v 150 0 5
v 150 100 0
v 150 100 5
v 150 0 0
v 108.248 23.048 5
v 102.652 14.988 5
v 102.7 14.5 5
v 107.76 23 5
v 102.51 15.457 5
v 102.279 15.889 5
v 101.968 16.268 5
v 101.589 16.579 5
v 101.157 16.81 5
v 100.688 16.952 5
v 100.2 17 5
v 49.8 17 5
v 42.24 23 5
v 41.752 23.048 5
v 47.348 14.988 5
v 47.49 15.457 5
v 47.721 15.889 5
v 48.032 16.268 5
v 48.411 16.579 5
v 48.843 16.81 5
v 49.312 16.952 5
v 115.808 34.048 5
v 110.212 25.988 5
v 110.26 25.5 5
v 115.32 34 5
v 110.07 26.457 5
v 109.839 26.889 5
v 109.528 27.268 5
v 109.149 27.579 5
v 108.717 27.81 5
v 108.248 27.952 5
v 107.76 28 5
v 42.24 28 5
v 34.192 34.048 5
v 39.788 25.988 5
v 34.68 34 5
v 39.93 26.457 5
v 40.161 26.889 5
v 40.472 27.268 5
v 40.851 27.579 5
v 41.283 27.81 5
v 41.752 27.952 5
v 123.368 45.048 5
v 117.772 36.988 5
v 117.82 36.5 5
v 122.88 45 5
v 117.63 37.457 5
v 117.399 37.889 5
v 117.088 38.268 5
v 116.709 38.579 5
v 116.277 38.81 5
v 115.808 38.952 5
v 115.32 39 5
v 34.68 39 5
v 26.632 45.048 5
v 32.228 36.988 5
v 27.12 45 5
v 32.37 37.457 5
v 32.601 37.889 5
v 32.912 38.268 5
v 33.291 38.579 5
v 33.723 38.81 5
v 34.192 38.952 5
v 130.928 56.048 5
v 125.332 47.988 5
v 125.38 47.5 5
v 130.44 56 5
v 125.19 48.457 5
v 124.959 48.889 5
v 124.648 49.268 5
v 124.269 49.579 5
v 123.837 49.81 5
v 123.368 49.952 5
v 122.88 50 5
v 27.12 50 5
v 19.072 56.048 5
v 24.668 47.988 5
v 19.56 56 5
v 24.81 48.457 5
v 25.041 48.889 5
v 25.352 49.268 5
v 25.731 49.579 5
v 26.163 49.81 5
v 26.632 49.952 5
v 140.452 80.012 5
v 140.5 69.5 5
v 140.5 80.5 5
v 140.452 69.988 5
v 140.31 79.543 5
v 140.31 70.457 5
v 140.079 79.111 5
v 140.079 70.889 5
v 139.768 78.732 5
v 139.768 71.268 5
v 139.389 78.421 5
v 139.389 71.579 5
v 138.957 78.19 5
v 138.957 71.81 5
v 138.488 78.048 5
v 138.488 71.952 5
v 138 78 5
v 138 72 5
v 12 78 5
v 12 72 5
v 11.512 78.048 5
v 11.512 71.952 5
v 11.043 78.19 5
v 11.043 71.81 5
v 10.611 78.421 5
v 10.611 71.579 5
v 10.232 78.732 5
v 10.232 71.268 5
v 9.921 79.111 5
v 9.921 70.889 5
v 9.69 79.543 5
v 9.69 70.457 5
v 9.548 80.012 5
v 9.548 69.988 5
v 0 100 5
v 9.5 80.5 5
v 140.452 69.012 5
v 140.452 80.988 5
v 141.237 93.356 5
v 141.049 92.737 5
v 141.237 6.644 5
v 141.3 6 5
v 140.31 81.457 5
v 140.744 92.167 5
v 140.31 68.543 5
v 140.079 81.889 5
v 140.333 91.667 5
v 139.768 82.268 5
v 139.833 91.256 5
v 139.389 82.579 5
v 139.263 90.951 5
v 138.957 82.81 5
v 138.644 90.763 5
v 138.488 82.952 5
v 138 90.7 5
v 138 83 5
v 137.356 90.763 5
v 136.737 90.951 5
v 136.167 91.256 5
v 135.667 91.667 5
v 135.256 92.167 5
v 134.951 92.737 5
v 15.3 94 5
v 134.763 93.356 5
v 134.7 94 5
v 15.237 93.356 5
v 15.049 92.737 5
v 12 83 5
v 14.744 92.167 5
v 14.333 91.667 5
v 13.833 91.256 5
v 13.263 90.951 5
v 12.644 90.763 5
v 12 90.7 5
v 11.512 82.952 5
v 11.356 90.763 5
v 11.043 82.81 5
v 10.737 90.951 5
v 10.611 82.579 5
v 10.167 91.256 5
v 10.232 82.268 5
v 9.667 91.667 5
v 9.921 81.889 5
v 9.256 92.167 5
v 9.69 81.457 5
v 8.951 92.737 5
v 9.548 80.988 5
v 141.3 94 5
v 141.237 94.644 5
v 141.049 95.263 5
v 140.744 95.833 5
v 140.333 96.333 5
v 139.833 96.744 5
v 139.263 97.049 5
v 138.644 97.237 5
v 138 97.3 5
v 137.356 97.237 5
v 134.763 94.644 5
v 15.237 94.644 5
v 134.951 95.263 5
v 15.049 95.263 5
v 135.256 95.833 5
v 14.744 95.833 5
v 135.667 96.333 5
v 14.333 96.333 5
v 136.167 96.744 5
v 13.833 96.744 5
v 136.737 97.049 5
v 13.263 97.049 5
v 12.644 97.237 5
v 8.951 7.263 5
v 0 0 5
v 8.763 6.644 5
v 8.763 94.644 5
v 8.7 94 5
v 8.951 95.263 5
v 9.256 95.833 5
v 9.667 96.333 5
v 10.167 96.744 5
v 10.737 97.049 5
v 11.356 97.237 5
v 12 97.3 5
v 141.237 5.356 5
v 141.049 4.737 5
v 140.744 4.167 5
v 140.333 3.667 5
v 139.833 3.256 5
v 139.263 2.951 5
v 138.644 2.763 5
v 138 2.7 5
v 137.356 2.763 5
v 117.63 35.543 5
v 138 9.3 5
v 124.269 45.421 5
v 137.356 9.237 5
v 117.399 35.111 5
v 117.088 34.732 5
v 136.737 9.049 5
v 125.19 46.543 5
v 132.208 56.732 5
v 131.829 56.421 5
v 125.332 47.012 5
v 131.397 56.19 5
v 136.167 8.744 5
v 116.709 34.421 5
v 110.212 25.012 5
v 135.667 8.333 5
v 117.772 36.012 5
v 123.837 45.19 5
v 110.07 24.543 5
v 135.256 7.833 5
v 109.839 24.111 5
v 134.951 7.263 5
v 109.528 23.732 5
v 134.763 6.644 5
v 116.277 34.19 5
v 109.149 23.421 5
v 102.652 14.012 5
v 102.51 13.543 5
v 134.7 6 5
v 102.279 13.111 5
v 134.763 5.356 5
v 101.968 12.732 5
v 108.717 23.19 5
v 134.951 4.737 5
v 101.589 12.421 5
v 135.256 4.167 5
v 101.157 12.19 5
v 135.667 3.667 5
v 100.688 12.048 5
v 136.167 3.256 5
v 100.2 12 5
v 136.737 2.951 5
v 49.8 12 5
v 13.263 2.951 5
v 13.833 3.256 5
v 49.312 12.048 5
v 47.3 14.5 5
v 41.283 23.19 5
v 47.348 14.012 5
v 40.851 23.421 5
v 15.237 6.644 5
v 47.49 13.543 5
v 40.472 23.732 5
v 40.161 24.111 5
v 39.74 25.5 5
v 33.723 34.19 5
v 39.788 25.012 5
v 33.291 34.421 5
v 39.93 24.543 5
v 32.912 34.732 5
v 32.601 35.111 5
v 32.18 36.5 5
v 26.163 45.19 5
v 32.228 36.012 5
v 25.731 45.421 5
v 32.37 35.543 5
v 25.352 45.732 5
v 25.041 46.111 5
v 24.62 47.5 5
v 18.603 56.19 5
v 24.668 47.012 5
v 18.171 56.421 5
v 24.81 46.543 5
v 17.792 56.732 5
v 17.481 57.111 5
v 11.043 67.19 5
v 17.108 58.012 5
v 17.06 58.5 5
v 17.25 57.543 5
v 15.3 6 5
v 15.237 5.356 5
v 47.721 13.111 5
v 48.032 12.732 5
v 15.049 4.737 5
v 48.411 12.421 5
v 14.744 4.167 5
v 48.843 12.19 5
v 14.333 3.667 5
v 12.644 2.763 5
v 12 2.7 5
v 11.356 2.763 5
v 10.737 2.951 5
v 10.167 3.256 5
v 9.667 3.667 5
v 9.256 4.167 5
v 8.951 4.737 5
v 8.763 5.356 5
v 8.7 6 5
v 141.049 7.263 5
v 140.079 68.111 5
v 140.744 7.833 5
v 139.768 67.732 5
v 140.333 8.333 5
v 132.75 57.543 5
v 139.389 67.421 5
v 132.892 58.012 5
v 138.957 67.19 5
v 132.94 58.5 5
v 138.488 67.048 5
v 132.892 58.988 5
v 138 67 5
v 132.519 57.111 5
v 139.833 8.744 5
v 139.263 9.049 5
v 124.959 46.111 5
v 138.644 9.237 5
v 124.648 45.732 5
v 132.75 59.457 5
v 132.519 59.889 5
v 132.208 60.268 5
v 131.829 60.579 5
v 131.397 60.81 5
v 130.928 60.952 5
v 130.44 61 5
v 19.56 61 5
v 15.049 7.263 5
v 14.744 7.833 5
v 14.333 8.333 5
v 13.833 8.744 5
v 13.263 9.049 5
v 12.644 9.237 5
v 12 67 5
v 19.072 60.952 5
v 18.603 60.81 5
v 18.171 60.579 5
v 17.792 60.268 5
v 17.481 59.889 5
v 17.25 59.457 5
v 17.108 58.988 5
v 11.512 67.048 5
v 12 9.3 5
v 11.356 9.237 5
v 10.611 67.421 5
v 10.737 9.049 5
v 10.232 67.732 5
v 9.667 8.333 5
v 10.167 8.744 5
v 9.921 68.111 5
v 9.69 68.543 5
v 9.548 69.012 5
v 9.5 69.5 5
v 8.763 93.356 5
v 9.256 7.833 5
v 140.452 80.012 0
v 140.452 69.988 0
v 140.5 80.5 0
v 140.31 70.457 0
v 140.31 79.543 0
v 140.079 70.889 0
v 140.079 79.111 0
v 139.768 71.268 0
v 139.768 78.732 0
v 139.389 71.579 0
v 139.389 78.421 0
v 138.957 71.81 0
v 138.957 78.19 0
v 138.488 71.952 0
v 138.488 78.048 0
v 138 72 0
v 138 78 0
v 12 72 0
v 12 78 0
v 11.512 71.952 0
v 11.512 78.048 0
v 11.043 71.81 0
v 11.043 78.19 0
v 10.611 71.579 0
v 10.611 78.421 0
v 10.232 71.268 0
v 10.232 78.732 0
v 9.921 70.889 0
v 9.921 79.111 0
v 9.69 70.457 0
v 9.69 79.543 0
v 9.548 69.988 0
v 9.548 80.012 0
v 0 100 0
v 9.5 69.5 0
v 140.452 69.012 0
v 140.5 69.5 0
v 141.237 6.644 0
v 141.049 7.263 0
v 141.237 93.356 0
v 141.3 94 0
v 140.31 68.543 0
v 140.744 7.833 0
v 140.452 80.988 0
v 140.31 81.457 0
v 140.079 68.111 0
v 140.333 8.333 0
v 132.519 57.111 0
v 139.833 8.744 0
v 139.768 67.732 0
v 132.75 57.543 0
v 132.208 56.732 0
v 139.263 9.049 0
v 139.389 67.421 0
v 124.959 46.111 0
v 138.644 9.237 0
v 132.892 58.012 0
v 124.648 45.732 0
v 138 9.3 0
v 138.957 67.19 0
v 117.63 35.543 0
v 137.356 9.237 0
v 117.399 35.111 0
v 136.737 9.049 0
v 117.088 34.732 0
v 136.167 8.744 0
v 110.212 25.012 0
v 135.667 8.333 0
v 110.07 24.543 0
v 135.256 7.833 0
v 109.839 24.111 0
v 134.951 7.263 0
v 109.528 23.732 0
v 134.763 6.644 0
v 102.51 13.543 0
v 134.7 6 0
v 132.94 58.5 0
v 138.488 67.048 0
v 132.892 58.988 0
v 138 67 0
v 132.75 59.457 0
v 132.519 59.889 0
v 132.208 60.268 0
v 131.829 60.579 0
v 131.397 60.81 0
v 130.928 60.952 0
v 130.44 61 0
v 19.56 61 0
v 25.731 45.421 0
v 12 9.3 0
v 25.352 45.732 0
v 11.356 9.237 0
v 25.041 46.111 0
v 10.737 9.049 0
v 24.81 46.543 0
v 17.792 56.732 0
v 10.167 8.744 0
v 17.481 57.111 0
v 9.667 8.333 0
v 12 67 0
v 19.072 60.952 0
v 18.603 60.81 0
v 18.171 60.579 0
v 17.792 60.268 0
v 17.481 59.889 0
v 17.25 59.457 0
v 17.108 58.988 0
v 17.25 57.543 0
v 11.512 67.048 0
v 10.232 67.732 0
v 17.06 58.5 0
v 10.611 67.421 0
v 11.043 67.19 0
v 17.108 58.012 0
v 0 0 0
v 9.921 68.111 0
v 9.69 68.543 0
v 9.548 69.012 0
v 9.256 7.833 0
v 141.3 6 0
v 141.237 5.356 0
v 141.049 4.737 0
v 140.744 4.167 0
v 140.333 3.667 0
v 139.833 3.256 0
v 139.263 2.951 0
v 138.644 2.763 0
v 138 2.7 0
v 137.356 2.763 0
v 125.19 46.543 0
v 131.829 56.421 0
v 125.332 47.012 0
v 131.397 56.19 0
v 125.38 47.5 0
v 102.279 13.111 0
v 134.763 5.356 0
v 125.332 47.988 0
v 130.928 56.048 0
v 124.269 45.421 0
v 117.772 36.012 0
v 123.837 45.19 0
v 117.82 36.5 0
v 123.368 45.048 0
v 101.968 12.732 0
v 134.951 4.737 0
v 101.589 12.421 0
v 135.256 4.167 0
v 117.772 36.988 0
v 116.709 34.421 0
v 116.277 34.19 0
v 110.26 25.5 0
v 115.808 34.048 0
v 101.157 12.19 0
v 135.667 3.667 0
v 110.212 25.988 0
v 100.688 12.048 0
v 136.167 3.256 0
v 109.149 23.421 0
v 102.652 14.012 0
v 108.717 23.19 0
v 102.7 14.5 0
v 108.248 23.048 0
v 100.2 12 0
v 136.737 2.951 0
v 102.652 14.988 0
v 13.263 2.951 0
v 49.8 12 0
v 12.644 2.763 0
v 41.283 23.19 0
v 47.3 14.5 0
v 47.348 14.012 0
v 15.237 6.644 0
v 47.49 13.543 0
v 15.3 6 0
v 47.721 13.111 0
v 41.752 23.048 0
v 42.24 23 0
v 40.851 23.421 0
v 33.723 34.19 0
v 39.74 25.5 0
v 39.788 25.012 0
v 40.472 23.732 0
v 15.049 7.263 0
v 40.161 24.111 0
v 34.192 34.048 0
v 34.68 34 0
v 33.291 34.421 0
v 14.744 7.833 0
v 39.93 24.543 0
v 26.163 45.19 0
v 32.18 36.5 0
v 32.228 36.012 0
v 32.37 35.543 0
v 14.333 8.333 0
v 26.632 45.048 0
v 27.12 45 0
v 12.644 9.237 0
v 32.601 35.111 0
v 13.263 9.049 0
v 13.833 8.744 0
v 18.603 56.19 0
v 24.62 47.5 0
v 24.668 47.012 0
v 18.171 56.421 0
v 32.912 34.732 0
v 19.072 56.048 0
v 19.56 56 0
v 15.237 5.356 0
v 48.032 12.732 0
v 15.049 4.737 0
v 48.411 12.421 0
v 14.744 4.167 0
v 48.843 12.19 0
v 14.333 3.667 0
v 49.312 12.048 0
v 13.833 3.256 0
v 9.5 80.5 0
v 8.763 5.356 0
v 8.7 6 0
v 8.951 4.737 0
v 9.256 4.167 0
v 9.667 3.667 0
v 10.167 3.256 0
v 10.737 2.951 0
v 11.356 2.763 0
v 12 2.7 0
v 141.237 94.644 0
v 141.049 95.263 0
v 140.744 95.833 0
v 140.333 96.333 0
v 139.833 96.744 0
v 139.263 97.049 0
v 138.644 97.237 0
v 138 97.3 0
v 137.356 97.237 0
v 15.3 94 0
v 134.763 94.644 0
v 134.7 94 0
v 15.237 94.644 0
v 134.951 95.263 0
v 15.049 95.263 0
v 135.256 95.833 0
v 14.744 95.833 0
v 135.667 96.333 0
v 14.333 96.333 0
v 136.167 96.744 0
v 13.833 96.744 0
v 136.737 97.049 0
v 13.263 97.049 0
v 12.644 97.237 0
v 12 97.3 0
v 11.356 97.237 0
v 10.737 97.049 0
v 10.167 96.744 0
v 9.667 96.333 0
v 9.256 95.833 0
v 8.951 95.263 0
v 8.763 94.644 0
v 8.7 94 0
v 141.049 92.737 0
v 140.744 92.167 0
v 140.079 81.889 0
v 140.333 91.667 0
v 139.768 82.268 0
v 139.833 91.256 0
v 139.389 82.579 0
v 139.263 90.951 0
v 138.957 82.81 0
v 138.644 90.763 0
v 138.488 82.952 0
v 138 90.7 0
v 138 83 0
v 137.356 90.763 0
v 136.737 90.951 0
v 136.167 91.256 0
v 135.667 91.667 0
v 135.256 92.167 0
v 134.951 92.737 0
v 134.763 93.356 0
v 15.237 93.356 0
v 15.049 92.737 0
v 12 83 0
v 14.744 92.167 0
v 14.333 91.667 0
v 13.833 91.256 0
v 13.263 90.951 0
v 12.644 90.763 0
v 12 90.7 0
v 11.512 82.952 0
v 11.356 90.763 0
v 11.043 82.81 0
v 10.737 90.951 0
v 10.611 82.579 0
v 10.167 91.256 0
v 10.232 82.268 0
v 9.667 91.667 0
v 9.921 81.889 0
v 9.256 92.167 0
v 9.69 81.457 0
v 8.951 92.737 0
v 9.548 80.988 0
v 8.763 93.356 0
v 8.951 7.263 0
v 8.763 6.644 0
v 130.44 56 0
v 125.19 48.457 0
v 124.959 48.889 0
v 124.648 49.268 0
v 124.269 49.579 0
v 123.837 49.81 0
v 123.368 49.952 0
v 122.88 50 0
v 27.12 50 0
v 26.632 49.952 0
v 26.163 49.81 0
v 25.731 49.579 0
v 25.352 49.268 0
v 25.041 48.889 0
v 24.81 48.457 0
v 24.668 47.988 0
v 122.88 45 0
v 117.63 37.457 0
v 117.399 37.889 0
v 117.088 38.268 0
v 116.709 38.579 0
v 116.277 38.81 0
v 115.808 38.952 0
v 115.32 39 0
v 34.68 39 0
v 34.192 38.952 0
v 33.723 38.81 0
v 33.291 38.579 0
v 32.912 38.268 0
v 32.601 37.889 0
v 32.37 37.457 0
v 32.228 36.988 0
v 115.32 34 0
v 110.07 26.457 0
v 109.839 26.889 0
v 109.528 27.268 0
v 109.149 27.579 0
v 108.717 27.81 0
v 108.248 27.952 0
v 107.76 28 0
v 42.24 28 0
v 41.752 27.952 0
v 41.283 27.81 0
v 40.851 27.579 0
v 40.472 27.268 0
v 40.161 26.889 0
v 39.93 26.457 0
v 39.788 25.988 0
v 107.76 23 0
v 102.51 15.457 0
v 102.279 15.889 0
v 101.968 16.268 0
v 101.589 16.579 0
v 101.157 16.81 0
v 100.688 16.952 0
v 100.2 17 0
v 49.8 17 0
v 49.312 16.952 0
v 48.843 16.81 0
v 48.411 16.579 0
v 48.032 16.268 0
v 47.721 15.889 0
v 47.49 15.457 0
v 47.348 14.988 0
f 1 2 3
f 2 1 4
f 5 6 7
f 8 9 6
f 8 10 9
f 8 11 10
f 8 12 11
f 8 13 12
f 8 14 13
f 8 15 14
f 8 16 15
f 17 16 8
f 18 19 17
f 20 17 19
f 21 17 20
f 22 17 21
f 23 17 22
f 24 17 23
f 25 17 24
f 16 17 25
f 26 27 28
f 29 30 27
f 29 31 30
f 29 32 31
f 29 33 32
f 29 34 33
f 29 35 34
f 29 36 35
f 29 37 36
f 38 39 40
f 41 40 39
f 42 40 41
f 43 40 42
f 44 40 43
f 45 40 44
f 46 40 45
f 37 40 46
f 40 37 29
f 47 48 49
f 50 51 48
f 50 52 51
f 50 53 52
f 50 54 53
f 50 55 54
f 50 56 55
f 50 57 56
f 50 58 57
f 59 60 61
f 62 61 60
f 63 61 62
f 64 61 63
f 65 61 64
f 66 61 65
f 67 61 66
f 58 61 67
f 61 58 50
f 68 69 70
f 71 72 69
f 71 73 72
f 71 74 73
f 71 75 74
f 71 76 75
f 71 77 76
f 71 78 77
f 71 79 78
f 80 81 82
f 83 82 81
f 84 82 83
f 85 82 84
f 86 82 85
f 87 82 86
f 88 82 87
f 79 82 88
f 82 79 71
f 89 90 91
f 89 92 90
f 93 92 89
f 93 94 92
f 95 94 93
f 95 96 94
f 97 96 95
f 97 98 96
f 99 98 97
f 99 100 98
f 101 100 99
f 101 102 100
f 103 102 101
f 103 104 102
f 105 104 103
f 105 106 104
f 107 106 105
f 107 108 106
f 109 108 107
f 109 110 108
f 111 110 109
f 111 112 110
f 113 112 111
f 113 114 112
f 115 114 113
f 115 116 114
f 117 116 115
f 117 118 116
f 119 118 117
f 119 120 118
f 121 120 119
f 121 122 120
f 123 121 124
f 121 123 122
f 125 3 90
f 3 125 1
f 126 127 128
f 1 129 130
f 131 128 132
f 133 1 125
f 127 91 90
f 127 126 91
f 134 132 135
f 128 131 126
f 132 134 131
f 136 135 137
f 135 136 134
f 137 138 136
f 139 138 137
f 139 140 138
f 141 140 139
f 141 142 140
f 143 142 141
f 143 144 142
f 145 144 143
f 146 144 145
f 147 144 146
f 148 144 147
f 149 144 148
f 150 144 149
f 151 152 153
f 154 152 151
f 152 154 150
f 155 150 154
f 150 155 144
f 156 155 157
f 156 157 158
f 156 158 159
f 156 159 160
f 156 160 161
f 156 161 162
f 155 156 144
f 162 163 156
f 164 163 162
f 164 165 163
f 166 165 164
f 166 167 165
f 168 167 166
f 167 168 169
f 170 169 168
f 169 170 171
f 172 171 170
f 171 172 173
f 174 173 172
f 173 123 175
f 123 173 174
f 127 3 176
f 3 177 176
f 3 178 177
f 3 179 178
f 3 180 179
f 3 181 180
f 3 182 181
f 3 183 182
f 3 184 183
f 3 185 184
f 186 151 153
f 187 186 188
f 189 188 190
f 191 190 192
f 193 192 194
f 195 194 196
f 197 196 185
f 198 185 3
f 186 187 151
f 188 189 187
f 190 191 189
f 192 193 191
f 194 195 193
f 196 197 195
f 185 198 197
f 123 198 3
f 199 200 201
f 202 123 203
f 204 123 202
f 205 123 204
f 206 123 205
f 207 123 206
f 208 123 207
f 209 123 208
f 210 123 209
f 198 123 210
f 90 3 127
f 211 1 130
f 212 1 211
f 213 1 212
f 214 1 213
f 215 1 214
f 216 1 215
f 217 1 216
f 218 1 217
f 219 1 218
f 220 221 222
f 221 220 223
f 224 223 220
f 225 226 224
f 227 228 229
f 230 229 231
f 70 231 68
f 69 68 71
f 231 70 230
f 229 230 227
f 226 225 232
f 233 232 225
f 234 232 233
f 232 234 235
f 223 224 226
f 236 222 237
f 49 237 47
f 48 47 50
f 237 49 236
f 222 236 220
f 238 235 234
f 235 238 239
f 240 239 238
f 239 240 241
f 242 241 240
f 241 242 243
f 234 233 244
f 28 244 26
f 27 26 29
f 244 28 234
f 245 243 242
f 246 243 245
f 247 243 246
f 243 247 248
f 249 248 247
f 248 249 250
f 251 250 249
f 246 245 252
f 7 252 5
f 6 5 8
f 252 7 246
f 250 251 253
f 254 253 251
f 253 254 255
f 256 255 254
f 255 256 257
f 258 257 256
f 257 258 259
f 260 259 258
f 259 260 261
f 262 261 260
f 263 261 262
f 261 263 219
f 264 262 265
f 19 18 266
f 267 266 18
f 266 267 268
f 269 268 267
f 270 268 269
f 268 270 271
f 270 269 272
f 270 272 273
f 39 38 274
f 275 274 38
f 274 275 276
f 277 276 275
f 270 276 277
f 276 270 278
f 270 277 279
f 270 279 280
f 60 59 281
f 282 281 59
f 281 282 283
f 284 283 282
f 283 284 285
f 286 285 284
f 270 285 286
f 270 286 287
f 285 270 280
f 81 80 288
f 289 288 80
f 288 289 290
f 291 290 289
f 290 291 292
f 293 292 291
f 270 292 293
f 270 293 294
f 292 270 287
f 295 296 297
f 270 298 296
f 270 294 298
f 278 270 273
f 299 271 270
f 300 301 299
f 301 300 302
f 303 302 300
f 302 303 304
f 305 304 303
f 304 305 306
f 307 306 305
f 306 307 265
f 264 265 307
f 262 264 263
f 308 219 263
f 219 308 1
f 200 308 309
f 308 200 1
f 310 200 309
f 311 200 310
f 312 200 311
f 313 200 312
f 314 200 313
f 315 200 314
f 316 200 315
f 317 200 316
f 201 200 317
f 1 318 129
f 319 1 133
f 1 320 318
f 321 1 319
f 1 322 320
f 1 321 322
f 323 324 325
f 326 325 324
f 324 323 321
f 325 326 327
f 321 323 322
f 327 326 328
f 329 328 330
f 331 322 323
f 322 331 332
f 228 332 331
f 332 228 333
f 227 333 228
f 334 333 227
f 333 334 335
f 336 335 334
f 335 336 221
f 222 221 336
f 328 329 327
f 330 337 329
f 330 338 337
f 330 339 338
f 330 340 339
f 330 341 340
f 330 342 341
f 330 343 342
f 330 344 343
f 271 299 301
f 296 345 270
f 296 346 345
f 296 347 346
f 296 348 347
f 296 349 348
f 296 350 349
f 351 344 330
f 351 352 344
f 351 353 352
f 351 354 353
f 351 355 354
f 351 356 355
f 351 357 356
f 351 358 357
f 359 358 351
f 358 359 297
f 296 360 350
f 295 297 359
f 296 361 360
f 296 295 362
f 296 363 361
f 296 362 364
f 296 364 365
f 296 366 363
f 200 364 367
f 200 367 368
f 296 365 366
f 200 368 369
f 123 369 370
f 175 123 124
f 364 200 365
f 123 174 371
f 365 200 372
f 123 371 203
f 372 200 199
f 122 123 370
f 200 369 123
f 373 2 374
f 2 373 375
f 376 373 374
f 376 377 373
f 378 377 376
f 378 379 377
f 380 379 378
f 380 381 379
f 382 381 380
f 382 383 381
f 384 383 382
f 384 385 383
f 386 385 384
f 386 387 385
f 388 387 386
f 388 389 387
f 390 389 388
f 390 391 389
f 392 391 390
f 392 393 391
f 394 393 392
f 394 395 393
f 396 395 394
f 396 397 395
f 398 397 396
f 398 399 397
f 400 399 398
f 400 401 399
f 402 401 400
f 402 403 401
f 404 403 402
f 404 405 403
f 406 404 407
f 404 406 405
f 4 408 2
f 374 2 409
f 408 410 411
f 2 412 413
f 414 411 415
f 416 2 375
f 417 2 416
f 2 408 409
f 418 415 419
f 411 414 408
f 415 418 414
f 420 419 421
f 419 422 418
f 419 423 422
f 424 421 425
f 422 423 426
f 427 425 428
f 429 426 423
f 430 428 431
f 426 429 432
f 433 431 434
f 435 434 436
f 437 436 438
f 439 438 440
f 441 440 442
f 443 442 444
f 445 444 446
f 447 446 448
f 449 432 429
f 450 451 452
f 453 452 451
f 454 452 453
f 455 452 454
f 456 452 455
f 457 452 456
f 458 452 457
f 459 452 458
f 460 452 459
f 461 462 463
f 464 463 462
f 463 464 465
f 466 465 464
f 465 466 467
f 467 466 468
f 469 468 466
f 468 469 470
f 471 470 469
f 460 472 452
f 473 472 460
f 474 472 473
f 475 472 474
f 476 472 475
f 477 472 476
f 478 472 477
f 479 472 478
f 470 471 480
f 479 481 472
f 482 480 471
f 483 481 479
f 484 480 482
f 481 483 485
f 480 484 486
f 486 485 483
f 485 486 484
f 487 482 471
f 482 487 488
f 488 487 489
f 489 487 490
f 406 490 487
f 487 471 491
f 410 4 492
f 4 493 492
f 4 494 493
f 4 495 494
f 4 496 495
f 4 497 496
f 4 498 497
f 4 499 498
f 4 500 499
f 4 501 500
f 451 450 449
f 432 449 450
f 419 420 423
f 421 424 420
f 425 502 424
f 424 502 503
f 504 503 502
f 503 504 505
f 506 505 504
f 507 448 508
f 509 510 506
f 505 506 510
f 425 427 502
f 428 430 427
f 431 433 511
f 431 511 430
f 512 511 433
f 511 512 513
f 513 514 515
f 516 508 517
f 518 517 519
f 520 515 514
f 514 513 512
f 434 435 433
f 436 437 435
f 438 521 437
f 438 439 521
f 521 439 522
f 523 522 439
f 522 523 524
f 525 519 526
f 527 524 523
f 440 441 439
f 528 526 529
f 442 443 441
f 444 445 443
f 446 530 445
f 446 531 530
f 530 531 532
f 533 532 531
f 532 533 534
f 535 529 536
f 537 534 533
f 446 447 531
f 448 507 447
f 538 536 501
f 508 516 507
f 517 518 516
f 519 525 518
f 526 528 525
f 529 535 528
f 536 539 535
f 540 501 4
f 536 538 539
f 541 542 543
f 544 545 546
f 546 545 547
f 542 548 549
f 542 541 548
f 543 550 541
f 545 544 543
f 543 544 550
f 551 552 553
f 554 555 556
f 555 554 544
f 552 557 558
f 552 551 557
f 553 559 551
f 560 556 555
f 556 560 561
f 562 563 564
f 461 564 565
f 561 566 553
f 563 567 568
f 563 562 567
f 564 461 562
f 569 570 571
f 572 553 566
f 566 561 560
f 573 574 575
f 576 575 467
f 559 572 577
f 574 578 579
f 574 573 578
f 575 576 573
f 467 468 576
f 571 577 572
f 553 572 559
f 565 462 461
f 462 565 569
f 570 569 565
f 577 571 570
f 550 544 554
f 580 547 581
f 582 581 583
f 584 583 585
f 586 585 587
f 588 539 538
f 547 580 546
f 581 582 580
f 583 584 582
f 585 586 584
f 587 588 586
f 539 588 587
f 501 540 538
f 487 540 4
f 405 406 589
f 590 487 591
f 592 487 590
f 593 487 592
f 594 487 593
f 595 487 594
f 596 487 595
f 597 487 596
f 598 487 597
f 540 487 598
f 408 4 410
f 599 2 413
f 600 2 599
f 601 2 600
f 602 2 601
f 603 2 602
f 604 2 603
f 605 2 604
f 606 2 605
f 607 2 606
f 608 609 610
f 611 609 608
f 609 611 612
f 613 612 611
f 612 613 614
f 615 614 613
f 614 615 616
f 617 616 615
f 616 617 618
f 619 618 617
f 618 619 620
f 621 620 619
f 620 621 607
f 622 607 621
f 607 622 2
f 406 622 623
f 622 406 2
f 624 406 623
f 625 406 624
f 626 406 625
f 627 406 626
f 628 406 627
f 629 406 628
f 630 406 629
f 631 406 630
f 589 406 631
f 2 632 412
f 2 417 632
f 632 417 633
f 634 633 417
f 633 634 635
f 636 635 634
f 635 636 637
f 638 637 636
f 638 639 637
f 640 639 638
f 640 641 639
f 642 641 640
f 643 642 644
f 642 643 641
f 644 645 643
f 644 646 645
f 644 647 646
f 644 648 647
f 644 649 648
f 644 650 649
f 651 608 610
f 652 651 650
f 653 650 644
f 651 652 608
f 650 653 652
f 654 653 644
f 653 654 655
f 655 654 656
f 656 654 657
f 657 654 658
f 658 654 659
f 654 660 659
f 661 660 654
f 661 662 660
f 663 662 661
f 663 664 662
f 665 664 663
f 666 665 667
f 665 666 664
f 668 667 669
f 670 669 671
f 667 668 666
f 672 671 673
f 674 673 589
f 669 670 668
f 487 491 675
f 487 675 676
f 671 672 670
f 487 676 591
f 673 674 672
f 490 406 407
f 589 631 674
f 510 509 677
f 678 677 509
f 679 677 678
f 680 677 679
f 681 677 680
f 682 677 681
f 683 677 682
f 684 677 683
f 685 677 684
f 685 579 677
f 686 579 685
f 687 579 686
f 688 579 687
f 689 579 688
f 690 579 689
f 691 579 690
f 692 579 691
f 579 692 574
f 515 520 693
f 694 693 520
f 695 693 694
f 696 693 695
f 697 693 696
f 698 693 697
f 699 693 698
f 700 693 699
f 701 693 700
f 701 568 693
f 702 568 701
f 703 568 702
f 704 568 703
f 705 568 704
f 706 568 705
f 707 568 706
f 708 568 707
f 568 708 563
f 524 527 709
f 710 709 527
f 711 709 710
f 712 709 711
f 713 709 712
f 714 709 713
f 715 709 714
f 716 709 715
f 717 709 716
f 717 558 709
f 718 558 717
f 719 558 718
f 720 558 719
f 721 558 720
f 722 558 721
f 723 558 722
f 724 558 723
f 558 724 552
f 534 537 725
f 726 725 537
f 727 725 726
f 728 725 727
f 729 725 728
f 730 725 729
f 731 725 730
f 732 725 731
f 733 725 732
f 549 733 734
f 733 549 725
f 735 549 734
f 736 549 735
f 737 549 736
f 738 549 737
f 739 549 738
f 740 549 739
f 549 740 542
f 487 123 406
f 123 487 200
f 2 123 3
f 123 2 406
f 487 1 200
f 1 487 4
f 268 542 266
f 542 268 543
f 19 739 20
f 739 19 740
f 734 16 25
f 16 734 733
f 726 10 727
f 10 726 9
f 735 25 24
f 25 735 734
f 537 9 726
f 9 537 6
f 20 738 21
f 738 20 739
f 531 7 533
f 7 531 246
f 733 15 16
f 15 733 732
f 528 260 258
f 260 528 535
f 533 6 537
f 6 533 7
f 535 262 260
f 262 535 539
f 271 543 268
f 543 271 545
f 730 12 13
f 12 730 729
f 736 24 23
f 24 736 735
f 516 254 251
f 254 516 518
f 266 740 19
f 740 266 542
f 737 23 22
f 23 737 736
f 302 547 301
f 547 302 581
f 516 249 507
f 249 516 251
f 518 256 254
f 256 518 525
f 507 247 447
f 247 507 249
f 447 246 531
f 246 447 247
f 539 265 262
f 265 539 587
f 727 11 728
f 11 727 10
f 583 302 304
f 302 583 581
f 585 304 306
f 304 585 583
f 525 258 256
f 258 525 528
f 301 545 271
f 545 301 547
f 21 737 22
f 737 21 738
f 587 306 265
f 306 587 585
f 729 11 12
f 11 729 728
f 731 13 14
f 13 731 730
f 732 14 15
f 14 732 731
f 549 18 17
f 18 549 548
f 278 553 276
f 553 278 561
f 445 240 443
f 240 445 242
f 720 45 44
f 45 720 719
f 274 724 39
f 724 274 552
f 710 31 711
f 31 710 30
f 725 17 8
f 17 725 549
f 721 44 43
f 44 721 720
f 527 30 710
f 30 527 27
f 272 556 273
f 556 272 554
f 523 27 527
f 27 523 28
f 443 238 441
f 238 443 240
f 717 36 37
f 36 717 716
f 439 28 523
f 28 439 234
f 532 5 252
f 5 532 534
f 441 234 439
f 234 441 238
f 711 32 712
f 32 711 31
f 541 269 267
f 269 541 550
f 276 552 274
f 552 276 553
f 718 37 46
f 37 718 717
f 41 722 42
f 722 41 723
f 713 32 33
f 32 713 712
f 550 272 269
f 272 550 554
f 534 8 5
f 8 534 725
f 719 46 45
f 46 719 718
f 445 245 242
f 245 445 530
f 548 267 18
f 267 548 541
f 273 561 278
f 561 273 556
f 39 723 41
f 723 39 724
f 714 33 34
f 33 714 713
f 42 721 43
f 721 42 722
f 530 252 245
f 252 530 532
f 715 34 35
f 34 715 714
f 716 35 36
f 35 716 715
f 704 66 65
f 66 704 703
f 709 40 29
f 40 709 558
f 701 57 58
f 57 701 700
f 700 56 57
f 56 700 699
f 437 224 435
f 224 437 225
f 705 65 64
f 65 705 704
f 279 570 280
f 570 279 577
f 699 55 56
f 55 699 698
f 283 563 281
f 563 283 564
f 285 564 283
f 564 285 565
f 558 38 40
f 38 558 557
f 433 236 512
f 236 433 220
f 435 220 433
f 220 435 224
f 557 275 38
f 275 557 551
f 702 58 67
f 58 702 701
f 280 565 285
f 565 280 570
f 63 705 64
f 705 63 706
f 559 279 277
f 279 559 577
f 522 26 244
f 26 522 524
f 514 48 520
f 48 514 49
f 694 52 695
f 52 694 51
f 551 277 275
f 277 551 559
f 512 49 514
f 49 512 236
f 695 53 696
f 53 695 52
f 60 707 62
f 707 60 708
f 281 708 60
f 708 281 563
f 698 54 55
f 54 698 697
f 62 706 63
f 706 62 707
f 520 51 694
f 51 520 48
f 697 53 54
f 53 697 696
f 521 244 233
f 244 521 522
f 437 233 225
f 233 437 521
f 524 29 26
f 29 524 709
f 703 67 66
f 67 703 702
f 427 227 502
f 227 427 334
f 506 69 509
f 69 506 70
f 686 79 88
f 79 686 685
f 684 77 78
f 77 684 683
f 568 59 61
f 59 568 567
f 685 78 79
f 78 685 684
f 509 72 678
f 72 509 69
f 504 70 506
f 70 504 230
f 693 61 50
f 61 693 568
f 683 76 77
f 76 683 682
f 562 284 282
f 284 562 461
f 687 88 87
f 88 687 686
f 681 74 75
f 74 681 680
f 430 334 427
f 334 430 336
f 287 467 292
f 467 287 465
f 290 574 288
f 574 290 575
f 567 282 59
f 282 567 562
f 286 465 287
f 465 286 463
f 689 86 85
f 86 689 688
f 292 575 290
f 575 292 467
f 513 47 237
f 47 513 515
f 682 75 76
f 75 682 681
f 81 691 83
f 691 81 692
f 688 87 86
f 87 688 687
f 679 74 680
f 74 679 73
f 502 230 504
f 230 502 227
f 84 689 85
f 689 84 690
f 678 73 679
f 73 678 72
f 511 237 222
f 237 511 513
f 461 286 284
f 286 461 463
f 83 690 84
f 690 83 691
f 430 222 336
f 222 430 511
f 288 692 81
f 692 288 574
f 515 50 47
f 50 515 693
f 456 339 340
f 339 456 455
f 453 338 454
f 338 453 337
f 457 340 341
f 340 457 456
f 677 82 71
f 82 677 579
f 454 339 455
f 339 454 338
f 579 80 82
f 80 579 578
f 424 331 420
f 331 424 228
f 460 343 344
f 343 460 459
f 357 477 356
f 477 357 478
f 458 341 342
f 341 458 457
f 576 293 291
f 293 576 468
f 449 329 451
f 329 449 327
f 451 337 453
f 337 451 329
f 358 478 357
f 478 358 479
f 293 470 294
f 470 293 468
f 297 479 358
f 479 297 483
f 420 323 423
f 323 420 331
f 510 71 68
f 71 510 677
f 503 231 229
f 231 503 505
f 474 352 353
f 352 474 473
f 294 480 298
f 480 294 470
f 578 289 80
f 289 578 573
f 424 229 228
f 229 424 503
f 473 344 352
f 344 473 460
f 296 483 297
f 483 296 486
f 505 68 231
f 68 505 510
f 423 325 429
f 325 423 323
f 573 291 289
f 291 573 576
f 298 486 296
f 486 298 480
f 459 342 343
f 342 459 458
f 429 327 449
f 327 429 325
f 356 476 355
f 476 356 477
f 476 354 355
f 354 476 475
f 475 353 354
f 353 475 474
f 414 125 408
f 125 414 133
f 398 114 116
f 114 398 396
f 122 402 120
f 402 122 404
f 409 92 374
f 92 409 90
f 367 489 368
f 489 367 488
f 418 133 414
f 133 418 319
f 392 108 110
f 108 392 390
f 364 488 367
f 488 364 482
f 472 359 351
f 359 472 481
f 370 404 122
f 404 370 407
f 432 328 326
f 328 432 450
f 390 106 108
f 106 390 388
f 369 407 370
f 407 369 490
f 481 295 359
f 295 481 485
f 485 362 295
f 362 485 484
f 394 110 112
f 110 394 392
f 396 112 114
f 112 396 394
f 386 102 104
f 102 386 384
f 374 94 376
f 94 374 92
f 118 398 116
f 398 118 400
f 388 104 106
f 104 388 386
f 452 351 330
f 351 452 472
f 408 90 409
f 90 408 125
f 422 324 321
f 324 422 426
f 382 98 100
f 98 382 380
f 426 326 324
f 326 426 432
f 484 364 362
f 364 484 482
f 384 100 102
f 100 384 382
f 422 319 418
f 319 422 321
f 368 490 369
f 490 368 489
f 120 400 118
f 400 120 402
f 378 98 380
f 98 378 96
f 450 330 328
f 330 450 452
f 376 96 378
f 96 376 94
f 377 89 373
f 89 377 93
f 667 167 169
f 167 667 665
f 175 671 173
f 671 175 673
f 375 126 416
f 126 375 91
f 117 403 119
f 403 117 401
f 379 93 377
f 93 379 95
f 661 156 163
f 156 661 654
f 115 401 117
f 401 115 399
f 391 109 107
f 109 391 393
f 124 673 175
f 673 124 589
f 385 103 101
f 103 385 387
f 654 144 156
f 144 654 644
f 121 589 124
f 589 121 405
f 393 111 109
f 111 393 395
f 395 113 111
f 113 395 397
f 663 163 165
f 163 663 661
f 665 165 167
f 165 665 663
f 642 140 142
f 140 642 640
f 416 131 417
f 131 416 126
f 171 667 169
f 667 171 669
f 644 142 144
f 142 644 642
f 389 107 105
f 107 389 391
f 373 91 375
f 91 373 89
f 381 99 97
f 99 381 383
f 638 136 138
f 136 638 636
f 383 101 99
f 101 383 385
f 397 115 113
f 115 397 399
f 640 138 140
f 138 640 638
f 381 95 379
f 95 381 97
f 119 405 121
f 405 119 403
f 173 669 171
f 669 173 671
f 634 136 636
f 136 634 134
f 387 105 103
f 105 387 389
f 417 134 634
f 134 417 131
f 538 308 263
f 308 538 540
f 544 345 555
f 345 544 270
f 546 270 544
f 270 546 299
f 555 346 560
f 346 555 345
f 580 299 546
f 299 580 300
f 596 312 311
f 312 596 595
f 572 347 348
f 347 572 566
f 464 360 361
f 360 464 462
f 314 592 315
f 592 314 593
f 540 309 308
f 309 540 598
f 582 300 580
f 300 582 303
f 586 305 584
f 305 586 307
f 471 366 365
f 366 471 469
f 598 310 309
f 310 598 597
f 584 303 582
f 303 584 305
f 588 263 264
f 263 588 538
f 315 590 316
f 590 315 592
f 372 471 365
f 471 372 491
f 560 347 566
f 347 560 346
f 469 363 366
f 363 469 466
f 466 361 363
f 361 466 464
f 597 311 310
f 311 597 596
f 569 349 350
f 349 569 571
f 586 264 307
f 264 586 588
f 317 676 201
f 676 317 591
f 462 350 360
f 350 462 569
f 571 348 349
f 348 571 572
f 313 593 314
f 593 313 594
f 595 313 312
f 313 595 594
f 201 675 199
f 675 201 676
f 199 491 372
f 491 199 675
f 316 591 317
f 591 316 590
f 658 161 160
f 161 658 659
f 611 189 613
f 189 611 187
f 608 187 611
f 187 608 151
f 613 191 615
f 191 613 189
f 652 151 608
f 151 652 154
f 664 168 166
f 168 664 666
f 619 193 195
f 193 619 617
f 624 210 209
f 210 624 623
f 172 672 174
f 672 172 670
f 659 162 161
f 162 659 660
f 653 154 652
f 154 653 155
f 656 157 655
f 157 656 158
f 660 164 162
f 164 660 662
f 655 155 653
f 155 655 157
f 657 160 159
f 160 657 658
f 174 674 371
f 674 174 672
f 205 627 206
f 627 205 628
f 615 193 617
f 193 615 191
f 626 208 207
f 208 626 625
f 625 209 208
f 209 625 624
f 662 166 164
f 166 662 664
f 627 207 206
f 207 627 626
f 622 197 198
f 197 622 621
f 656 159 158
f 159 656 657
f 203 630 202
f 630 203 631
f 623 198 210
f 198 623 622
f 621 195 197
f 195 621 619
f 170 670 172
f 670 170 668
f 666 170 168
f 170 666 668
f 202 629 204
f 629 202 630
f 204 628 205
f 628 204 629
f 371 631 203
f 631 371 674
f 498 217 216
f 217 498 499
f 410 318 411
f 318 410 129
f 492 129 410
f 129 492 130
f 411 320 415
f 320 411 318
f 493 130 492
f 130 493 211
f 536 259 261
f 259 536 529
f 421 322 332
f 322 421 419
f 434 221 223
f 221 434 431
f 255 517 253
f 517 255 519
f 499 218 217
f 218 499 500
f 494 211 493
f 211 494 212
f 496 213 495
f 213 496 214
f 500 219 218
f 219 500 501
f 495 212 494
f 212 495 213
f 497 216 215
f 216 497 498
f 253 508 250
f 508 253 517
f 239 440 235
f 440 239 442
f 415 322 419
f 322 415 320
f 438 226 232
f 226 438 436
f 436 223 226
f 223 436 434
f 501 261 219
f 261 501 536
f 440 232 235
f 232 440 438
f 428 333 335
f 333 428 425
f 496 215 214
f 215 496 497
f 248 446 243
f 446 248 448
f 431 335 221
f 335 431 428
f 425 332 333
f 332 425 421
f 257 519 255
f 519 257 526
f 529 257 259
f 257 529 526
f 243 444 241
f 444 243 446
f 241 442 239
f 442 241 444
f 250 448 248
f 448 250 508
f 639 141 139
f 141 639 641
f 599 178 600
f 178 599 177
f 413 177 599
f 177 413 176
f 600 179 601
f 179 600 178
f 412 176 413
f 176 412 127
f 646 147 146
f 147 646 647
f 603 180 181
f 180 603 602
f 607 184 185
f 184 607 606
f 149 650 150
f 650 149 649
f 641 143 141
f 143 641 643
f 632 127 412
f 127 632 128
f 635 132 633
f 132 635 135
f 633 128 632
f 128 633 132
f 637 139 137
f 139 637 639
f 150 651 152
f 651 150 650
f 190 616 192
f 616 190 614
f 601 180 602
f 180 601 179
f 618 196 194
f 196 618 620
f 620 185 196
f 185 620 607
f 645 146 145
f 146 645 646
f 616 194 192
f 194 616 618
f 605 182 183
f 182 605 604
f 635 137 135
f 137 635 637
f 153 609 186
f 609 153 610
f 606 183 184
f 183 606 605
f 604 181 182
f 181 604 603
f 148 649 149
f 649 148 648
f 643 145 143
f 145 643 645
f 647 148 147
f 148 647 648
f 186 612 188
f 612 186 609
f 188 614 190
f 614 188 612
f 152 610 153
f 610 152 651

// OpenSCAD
$fn = 32;

// ----------------------------------------------------------------------
// Slotted panel: 150 x 100 mm, 7 рядов of slots
// ----------------------------------------------------------------------

// --- parameters (mm) ---
panel_w = 150;            // panel width
panel_d = 100;            // panel depth
thick = 5;                // panel thickness
slot_w = 5;               // slot width
pitch0 = 11;              // first row pitch
pitch_step = 1.2;         // pitch increase per row
margin = 12;              // margin around the slot field
rows = 7;                 // number of slot rows
mount_d = 6.6;            // mounting holes
mount_x = 63;             // mounting hole offset

difference() {
  union() {
    cube([panel_w, panel_d, thick]);
  }
  /* slot rows: stadium shaped cutters, 2.5 mm clear of both faces */
  /* row 0: pitch 11, length 50.4 */
  hull() {
    translate([49.8, 14.5, -2.5]) cylinder(h = thick + 5, d = slot_w);
    translate([100.2, 14.5, -2.5]) cylinder(h = thick + 5, d = slot_w);
  }
  /* row 1: pitch 11, length 65.52 */
  hull() {
    translate([42.24, 25.5, -2.5]) cylinder(h = thick + 5, d = slot_w);
    translate([107.76, 25.5, -2.5]) cylinder(h = thick + 5, d = slot_w);
  }
  /* row 2: pitch 11, length 80.64 */
  hull() {
    translate([34.68, 36.5, -2.5]) cylinder(h = thick + 5, d = slot_w);
    translate([115.32, 36.5, -2.5]) cylinder(h = thick + 5, d = slot_w);
  }
  /* row 3: pitch 11, length 95.76 */
  hull() {
    translate([27.12, 47.5, -2.5]) cylinder(h = thick + 5, d = slot_w);
    translate([122.88, 47.5, -2.5]) cylinder(h = thick + 5, d = slot_w);
  }
  /* row 4: pitch 11, length 110.88 */
  hull() {
    translate([19.56, 58.5, -2.5]) cylinder(h = thick + 5, d = slot_w);
    translate([130.44, 58.5, -2.5]) cylinder(h = thick + 5, d = slot_w);
  }
  /* row 5: pitch 11, length 126 */
  hull() {
    translate([12, 69.5, -2.5]) cylinder(h = thick + 5, d = slot_w);
    translate([138, 69.5, -2.5]) cylinder(h = thick + 5, d = slot_w);
  }
  /* row 6: pitch 11, length 126 */
  hull() {
    translate([12, 80.5, -2.5]) cylinder(h = thick + 5, d = slot_w);
    translate([138, 80.5, -2.5]) cylinder(h = thick + 5, d = slot_w);
  }
  translate([12, 6, -2.5]) cylinder(h = 10, d = mount_d);
  translate([12, 94, -2.5]) cylinder(h = 10, d = mount_d);
  translate([138, 6, -2.5]) cylinder(h = 10, d = mount_d);
  translate([138, 94, -2.5]) cylinder(h = 10, d = mount_d);
}
